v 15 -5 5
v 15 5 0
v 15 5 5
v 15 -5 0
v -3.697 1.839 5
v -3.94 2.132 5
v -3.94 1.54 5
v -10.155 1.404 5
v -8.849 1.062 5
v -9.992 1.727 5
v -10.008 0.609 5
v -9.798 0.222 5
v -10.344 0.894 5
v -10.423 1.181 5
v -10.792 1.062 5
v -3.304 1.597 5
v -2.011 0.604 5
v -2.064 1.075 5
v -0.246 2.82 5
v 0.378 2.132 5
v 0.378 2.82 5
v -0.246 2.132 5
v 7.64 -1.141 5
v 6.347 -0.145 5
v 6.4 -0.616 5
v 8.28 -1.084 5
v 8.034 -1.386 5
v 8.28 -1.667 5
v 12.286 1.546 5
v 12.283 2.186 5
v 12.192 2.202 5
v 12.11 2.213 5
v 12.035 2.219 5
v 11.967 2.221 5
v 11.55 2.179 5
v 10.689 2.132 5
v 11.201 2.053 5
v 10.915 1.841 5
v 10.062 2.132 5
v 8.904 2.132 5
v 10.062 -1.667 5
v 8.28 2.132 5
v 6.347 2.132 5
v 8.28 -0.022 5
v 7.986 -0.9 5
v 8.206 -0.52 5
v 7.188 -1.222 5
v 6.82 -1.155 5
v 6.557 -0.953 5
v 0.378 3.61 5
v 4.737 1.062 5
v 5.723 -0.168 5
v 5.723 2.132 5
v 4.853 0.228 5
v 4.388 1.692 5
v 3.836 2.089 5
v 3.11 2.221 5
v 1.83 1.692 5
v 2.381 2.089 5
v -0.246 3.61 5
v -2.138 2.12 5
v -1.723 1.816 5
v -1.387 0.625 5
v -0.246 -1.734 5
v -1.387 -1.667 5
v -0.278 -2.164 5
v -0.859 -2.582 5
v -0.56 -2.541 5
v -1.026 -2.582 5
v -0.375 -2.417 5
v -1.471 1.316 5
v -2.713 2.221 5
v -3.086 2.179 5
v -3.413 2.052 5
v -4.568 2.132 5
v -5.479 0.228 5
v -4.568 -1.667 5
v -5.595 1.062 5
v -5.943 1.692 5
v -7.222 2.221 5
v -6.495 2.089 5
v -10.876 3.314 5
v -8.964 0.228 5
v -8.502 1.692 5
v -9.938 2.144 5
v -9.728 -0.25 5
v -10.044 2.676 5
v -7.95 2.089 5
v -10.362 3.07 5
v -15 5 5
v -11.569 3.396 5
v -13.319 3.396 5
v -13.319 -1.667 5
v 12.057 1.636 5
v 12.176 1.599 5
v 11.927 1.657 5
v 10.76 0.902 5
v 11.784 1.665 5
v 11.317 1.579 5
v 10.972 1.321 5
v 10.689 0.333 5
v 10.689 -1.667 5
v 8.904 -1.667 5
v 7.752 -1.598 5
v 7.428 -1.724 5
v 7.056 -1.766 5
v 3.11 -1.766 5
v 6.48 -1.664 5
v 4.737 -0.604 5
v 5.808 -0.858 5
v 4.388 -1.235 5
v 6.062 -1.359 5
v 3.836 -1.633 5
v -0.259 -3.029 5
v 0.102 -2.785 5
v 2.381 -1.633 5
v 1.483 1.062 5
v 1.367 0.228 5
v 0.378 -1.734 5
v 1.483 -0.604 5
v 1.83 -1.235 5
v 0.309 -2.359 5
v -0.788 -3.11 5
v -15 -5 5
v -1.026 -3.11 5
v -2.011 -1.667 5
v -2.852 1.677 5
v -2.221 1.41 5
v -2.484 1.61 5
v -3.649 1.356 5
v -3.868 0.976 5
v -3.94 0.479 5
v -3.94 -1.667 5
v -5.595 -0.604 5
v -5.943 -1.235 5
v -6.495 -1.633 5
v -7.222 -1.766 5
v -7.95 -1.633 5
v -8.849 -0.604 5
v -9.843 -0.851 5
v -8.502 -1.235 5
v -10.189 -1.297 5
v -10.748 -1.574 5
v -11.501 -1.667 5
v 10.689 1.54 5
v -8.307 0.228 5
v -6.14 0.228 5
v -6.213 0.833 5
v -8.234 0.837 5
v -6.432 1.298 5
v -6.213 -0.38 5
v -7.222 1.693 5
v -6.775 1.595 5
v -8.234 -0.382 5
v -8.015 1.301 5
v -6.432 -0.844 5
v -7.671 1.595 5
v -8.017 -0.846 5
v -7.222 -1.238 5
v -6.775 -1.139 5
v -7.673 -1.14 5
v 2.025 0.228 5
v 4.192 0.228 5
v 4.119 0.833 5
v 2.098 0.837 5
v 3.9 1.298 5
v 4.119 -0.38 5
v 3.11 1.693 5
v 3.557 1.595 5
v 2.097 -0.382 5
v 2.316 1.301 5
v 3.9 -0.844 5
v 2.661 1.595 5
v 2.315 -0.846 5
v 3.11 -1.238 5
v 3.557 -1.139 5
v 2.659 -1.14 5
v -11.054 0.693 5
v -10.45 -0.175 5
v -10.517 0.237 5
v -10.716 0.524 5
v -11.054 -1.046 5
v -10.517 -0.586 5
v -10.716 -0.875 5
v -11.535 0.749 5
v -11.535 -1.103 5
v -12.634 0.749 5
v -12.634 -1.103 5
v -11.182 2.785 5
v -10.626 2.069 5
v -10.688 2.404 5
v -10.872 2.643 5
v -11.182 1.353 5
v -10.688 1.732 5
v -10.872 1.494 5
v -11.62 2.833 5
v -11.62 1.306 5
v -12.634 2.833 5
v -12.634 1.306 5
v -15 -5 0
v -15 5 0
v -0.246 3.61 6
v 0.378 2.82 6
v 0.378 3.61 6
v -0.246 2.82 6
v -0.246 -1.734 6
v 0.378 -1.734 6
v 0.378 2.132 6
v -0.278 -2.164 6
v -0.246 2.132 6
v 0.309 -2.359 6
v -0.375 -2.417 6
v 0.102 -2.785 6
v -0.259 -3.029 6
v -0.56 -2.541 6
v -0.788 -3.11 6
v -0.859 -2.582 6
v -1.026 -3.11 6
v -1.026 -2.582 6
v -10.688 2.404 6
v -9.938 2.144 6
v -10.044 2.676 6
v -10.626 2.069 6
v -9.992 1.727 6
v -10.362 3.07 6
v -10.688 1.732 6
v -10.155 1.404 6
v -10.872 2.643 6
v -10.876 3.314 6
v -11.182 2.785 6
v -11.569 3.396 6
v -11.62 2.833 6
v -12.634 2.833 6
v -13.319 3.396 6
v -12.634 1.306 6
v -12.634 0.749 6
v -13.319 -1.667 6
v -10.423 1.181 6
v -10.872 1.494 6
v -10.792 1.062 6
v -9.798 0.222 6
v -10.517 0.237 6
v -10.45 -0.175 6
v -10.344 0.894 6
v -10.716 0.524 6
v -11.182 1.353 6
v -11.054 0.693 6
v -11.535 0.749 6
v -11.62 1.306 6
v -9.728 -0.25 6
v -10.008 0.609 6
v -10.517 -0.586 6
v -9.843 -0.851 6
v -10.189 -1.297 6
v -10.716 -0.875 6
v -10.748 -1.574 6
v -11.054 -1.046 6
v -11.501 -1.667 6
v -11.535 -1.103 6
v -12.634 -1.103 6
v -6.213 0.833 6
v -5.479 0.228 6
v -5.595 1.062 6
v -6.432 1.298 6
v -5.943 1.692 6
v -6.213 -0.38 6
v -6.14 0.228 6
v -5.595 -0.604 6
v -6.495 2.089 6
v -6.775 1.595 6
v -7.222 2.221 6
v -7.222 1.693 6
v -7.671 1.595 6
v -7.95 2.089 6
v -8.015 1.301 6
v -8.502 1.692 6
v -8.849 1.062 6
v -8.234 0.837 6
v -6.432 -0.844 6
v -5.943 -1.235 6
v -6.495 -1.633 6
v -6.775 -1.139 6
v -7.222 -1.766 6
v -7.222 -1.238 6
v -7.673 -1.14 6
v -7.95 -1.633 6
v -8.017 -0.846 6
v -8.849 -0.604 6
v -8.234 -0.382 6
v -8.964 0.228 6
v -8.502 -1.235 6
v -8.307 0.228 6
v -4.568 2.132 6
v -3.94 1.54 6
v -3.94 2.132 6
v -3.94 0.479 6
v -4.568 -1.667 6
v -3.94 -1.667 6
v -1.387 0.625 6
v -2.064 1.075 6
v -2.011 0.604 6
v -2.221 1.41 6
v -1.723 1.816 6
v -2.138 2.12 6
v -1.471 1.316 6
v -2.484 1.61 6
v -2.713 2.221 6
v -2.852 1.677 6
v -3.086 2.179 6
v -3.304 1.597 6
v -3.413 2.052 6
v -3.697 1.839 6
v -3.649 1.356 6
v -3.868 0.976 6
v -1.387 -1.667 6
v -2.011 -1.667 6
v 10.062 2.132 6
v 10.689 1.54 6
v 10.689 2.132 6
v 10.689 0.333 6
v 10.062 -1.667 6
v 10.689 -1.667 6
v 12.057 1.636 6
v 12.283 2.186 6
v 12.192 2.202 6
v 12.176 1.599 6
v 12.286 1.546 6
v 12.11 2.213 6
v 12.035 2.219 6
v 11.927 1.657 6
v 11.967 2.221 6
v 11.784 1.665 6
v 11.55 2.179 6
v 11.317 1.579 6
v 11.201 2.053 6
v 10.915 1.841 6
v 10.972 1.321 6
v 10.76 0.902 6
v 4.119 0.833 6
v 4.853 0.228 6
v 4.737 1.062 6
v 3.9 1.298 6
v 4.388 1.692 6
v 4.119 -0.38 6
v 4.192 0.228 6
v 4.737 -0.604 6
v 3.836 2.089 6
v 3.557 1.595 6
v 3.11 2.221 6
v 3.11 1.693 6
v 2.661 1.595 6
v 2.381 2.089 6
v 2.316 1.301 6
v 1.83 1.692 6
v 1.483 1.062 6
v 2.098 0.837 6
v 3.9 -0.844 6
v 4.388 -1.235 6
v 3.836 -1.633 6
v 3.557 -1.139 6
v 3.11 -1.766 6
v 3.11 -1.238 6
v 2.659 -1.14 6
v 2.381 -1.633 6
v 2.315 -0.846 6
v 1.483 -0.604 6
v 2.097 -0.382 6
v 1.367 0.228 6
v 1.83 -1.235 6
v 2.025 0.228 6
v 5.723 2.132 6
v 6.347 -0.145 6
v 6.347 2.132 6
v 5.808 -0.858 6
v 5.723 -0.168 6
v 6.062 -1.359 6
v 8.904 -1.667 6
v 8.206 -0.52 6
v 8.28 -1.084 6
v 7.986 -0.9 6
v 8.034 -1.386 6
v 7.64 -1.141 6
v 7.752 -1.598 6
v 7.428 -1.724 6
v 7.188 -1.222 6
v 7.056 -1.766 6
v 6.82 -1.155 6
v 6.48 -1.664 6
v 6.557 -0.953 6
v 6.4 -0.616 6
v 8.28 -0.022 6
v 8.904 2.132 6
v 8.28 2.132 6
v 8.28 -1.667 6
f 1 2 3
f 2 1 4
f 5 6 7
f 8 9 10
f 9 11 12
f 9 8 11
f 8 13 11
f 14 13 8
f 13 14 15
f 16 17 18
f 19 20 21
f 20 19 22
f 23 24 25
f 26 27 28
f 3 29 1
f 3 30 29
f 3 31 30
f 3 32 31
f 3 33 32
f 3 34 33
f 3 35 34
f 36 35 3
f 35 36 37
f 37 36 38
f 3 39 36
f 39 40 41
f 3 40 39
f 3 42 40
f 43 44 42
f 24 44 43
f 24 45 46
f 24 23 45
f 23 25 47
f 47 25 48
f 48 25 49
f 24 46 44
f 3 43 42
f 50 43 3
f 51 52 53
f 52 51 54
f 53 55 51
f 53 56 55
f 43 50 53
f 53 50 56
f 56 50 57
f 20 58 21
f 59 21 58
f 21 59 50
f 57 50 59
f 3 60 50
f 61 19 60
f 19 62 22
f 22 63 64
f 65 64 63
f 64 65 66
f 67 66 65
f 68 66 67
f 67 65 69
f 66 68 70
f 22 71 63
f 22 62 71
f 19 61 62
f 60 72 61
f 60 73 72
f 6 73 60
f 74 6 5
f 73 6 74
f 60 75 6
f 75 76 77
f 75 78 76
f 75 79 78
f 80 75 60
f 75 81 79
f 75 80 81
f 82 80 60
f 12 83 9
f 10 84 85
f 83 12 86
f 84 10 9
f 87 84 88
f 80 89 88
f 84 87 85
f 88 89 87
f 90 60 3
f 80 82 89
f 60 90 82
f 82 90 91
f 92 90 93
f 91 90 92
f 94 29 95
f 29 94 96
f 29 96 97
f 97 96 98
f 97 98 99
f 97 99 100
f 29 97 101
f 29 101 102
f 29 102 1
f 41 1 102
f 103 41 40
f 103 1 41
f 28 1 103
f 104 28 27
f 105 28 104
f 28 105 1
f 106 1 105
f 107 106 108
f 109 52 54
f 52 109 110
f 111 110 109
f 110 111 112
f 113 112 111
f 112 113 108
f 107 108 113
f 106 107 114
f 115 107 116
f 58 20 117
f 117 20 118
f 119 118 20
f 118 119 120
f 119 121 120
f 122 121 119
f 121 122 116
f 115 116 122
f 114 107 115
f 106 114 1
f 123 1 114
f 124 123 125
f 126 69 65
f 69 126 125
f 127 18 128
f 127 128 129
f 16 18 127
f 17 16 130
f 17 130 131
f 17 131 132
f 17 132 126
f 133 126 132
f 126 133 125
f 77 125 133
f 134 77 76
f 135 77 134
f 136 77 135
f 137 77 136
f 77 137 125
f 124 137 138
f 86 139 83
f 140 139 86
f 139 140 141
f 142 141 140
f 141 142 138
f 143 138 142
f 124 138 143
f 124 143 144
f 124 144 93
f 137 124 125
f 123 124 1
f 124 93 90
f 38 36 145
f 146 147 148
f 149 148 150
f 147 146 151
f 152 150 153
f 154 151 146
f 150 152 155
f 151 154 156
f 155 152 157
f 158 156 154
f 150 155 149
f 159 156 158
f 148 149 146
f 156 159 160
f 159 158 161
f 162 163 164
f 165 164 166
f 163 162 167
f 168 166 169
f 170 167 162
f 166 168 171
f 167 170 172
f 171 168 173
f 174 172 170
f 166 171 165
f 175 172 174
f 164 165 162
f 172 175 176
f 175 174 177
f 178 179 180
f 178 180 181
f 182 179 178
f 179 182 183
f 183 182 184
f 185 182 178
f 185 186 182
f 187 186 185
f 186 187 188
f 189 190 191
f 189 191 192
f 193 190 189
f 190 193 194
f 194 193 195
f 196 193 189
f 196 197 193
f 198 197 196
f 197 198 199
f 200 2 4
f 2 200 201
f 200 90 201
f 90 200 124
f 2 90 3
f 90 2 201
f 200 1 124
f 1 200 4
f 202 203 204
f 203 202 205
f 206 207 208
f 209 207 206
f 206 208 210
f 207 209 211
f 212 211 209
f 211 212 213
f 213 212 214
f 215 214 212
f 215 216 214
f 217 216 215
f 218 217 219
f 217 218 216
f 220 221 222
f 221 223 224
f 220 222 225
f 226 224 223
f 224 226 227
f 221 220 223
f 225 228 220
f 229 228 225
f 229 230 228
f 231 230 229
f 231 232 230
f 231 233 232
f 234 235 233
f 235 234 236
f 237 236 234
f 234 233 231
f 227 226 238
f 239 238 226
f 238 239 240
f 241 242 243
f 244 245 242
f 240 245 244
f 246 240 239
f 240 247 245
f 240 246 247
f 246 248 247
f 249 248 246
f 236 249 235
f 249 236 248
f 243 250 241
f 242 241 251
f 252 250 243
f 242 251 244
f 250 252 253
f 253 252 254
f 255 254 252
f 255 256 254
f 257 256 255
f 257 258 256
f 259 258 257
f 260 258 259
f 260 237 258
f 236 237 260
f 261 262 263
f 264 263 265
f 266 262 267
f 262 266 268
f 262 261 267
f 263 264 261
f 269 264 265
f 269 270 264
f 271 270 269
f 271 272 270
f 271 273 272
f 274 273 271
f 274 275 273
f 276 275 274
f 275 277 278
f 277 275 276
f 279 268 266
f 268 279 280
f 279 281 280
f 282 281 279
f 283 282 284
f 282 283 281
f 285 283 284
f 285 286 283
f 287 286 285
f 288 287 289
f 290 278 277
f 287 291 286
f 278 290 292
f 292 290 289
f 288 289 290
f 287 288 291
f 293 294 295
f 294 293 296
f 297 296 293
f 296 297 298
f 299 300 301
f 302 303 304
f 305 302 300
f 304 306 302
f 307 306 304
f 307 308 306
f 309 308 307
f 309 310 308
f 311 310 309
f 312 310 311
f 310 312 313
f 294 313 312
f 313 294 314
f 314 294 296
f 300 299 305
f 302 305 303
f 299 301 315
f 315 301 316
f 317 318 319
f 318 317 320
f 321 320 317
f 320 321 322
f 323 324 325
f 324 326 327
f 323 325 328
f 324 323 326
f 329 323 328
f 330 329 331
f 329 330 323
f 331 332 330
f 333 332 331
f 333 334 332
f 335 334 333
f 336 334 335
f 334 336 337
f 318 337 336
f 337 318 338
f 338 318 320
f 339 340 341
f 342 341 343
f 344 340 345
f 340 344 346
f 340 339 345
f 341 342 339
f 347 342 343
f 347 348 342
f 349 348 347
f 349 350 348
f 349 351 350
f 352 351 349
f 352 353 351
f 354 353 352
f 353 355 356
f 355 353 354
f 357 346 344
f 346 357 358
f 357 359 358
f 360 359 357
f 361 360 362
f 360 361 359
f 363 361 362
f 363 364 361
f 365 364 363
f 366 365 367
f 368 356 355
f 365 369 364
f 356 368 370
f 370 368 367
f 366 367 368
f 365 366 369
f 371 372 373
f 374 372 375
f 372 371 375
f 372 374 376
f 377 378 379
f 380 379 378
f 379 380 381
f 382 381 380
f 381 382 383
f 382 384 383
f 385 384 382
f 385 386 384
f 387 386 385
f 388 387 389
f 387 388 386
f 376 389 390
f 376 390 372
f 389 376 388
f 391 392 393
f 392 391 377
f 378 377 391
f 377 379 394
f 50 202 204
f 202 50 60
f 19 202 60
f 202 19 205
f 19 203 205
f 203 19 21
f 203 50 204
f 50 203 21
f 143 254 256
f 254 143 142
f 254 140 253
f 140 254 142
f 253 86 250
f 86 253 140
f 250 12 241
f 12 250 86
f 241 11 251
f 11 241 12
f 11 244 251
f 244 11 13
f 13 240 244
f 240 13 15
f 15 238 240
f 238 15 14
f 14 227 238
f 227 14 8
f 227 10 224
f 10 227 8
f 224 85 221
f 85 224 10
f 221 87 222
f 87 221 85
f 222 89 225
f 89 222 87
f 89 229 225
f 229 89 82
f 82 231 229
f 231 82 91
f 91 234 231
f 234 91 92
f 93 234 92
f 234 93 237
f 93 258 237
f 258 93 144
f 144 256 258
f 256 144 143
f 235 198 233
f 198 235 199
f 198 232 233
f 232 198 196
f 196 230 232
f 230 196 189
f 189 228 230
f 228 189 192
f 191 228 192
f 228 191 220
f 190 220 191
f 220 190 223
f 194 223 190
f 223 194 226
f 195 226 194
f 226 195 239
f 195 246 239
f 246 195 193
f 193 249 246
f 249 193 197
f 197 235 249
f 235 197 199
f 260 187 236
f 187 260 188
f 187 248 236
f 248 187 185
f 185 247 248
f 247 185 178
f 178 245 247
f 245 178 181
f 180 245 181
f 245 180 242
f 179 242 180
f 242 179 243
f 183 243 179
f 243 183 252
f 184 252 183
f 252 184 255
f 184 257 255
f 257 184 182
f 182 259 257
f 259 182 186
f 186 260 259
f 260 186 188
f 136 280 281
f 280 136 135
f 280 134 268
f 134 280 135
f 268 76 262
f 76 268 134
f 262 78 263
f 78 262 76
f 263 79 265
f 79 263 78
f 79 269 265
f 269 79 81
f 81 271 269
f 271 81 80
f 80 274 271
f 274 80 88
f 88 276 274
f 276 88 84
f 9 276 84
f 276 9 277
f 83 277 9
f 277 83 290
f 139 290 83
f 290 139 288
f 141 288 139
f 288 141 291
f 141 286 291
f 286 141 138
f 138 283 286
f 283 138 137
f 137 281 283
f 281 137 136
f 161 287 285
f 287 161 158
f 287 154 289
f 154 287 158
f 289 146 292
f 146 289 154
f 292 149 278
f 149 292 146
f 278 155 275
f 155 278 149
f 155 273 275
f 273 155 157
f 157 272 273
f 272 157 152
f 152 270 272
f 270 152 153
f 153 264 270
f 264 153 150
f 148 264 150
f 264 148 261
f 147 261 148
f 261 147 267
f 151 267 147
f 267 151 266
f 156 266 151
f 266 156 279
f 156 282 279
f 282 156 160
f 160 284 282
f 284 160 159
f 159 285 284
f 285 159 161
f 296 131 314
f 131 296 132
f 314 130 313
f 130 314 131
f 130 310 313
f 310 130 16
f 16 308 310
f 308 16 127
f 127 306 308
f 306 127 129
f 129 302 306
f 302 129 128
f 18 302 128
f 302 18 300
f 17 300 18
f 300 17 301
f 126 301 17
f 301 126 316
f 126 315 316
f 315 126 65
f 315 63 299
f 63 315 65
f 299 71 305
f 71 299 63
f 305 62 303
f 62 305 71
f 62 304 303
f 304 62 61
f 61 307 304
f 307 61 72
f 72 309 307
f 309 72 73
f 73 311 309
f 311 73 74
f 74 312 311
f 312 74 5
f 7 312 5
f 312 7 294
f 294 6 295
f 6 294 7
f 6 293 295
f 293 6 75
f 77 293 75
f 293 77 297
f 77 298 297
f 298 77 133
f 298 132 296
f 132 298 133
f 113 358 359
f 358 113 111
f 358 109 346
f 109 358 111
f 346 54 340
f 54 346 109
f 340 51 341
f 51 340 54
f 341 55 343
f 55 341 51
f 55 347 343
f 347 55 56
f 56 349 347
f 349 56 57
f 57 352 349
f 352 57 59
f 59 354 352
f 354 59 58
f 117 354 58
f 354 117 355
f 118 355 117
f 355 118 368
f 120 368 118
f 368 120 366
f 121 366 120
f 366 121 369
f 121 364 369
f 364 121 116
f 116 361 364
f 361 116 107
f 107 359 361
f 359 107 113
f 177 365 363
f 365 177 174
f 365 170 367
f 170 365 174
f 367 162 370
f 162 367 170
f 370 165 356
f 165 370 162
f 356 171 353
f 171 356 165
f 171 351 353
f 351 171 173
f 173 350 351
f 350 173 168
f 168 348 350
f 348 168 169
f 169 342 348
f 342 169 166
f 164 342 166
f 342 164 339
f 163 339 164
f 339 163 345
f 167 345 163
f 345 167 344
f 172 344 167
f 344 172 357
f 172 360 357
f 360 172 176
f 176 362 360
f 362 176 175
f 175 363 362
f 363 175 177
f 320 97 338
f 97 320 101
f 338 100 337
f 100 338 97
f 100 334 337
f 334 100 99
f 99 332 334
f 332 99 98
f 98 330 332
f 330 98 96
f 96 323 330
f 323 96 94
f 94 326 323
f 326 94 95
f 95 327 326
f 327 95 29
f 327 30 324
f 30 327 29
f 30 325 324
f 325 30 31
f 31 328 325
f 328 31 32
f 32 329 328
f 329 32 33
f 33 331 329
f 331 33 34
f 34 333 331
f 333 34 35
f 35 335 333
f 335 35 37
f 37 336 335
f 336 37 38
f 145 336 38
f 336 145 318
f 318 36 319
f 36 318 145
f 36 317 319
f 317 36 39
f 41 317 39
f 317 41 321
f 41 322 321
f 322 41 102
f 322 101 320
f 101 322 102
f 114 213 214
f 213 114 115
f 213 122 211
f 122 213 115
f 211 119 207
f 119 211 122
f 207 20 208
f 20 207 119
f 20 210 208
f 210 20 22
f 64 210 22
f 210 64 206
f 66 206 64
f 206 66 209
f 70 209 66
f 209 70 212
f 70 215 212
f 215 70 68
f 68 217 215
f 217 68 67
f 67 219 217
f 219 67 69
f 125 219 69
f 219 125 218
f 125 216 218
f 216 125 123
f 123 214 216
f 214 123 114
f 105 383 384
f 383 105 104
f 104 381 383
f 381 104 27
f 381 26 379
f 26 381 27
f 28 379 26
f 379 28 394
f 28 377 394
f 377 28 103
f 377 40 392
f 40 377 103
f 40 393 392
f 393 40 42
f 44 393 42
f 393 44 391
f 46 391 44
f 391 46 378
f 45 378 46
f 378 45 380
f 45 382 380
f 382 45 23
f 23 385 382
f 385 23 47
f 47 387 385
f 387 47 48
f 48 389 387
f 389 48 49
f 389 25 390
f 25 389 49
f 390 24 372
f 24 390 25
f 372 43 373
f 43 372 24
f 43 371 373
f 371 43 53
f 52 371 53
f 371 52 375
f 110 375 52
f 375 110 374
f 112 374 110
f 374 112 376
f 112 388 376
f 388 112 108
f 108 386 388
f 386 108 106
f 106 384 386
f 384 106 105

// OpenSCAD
$fn = 1; 
texte_a_inserer = "Bonjour"; 
taille = 5; 
police = "DejaVuSans"; //[[Abril Fatface,Aclonica,Acme,Advent Pro,Akronim,Aladin,Alegreya,Alegreya Sans,Alegreya SC,Alex Brush,Alfa Slab One,Alice,Amaranth,Architects Daughter,Archivo Black,Archivo Narrow,Arimo,Arvo,Asap,Astloch,Asul,Averia Libre,Averia Serif Libre,Bangers,Basic,Belgrano,Berkshire Swash,Bigshot One,Bilbo Swash Caps,Black Ops One,Bonbon,Bowlby One SC,Brawler,Bubblegum Sans,Butterfly Kids,Cabin Condensed,Caesar Dressing,Cagliostro,Calligraffitti,Capriola,Carter One,Changa One,Chango,Chelsea Market,Cherry Cream Soda,Chewy,Chicle,Chivo,Clicker Script,Coming Soon,Concert One,Condiment,Cookie,Courgette,Covered By Your Grace,Crimson Text,Dancing Script,DejaVu Sans,DejaVu Serif,Dhurjati,Doppio One,Dosis,Droid Sans,Eagle Lake,Electrolize,Emilys Candy,Encode Sans,Encode Sans Compressed,Euphoria Script,Exo,Exo 2,Faster One,Federo,Finger Paint,Fjord One,Fontdiner Swanky,Freckle Face,Fruktur,Gabriela,Geo,Germania One,Give You Glory,Gloria Hallelujah,Goudy Bookletter 1911,Graduate,Grand Hotel,Great Vibes,Griffy,Hanalei Fill,Happy Monkey,Henny Penny,Hind,IM Fell English SC,Indie Flower,Irish Grover,Italianno,Jacques Francois Shadow,Jolly Lodger,Josefin Slab,Joti One,Judson,Just Another Hand,Kalam,Kameron,Karma,Kavoon,Knewave,Kranky,Kristi,Laila,Lakki Reddy,Lancelot,Lato,Leckerli One,Ledger,Lekton,Lemon One,Liberation Sans,Libre Caslon Text,Life Savers,Lilita One,Lily Script One,Limelight,Lobster,Lobster Two,Londrina Outline,Londrina Shadow,Londrina Solid,Lora,Love Ya Like A Sister,Loved by the King,Lovers Quarrel,Luckiest Guy,Lusitana,Macondo,Macondo Swash Caps,Mako,Marck Script,Margarine,Marko One,Maven Pro,McLaren,MedievalSharp,Merienda One,Merriweather,Mervale Script,Metal Mania,Metrophobic,Milonga,Miltonian Tattoo,Miss Fajardose,Molle,Montez,Montserrat,Mr De Haviland,Mystery Quest,Neucha,New Rocker,Niconne,Nosifer,Nothing You Could Do,Noto Sans Oriya,Noto Serif,Nova Square,Nunito,Old Standard TT,Oleo Script,Oleo Script Swash Caps,Orbitron,Oregano,Orienta,Original Surfer,Oswald,Over the Rainbow,Overlock,Oxygen,Pacifico,Paprika,Parisienne,Patrick Hand SC,Paytone One,Peralta,Permanent Marker,Piedra,Pirata One,Play,Playball,Poetsen One,Poppins,Press Start 2P,Princess Sofia,PT Mono,Qwigley,Racing Sans One,Raleway,Rancho,Ranga,Ribeye,Roboto,Roboto Condensed,Roboto Slab,Rochester,Rock Salt,Rubik One,Sail,Salsa,Sansita One,Sarina,Satisfy,Schoolbell,Seaweed Script,Sevillana,Shadows Into Light,Shadows Into Light Two,Share,Six Caps,Skranji,Source Sans Pro,Spicy Rice,Stardos Stencil,Stoke,Syncopate,Teko,Terminal Dosis,The Girl Next Door,Tillana,Timmana,Titillium Web,Ubuntu,Ultra,Underdog,UnifrakturCook,UnifrakturMaguntia,Vampiro One,Vidaloka,Viga,Voces,Volkhov,Vollkorn,Voltaire,Waiting for the Sunrise,Wallpoet,Wellfleet,Wendy One,Yellowtail,Yesteryear,Zeyada]]
hauteur = 1; 
longueur_cube = 30; 
largeur_cube = 10; 
hauteur_cube = 5; 
relief_extrusion = "relief"; //[relief,extru]
module rendu(){
linear_extrude(hauteur) text(texte_a_inserer,size = taille, font = police);
}
module finao(){
if ( relief_extrusion == "relief") {
   union(){
 translate([0,0,0])   cube([longueur_cube,largeur_cube,hauteur_cube]);
translate([1,(largeur_cube/3),hauteur_cube]) rendu();
   } 
}
else
{
difference(){
 translate([0,0,0])   cube([longueur_cube,largeur_cube,hauteur_cube]);
translate([1,(largeur_cube/3),(hauteur_cube -hauteur+0.1)]) rendu();
}
 }
}
translate ([-(longueur_cube/2),-(largeur_cube/2),0]) finao();
